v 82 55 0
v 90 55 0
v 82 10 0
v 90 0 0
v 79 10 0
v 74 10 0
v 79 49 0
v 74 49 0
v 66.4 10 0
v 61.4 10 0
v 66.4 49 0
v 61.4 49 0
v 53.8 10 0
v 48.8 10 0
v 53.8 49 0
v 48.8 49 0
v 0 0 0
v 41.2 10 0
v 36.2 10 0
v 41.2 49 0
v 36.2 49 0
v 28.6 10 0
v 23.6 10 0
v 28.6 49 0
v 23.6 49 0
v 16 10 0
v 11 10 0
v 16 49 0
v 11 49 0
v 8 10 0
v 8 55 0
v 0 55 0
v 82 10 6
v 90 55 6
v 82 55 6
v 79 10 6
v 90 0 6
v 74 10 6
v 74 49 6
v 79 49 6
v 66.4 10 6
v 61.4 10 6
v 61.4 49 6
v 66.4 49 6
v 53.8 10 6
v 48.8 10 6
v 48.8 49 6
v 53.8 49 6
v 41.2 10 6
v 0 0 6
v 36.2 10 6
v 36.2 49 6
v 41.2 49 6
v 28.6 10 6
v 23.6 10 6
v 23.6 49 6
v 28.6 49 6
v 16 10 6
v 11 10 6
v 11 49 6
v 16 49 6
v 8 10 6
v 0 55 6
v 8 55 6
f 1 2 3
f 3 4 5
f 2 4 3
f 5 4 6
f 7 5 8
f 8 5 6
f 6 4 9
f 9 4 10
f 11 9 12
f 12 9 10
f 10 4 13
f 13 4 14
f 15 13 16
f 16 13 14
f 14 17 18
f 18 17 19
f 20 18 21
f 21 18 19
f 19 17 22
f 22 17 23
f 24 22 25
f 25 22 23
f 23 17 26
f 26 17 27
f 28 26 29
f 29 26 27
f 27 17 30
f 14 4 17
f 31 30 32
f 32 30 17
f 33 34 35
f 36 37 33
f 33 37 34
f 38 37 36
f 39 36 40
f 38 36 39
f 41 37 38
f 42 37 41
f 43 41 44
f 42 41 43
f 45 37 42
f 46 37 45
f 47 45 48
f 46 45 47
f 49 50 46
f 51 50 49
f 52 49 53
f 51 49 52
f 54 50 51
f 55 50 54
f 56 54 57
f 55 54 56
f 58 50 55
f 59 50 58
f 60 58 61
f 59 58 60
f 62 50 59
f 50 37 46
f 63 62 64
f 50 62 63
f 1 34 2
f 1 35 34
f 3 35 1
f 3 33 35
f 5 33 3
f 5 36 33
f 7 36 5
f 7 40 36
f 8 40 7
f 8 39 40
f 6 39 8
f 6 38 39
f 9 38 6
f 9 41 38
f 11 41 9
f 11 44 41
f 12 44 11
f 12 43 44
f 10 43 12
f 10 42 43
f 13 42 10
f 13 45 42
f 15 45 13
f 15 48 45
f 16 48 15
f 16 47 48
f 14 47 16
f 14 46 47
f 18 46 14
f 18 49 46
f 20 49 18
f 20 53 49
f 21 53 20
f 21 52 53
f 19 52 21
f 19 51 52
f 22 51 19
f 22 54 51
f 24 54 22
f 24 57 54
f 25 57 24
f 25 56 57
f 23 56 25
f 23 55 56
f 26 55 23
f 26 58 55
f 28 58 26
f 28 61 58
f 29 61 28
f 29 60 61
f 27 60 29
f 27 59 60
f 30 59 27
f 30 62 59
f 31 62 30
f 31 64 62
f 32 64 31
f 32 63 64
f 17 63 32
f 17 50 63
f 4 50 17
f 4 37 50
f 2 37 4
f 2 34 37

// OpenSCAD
$fn = 32;

// ----------------------------------------------------------------------
// Guard grille: 6 slats over a 90 x 55 mm plate
// ----------------------------------------------------------------------

// --- parameters (mm) ---
profile_height = 6;       // extrusion height
profile_points = 32;      // points of the closed outline

profile = [[0, 0], [90, 0], [90, 55], [82, 55], [82, 10], [79, 10], [79, 49], [74, 49], [74, 10], [66.4, 10], [66.4, 49], [61.4, 49], [61.4, 10], [53.8, 10], [53.8, 49], [48.8, 49], [48.8, 10], [41.2, 10], [41.2, 49], [36.2, 49], [36.2, 10], [28.6, 10], [28.6, 49], [23.6, 49], [23.6, 10], [16, 10], [16, 49], [11, 49], [11, 10], [8, 10], [8, 55], [0, 55]];  // single closed polygon, 32 points, counter clockwise

// --- the one profile operation ---
linear_extrude(height = profile_height) polygon(points = profile);
